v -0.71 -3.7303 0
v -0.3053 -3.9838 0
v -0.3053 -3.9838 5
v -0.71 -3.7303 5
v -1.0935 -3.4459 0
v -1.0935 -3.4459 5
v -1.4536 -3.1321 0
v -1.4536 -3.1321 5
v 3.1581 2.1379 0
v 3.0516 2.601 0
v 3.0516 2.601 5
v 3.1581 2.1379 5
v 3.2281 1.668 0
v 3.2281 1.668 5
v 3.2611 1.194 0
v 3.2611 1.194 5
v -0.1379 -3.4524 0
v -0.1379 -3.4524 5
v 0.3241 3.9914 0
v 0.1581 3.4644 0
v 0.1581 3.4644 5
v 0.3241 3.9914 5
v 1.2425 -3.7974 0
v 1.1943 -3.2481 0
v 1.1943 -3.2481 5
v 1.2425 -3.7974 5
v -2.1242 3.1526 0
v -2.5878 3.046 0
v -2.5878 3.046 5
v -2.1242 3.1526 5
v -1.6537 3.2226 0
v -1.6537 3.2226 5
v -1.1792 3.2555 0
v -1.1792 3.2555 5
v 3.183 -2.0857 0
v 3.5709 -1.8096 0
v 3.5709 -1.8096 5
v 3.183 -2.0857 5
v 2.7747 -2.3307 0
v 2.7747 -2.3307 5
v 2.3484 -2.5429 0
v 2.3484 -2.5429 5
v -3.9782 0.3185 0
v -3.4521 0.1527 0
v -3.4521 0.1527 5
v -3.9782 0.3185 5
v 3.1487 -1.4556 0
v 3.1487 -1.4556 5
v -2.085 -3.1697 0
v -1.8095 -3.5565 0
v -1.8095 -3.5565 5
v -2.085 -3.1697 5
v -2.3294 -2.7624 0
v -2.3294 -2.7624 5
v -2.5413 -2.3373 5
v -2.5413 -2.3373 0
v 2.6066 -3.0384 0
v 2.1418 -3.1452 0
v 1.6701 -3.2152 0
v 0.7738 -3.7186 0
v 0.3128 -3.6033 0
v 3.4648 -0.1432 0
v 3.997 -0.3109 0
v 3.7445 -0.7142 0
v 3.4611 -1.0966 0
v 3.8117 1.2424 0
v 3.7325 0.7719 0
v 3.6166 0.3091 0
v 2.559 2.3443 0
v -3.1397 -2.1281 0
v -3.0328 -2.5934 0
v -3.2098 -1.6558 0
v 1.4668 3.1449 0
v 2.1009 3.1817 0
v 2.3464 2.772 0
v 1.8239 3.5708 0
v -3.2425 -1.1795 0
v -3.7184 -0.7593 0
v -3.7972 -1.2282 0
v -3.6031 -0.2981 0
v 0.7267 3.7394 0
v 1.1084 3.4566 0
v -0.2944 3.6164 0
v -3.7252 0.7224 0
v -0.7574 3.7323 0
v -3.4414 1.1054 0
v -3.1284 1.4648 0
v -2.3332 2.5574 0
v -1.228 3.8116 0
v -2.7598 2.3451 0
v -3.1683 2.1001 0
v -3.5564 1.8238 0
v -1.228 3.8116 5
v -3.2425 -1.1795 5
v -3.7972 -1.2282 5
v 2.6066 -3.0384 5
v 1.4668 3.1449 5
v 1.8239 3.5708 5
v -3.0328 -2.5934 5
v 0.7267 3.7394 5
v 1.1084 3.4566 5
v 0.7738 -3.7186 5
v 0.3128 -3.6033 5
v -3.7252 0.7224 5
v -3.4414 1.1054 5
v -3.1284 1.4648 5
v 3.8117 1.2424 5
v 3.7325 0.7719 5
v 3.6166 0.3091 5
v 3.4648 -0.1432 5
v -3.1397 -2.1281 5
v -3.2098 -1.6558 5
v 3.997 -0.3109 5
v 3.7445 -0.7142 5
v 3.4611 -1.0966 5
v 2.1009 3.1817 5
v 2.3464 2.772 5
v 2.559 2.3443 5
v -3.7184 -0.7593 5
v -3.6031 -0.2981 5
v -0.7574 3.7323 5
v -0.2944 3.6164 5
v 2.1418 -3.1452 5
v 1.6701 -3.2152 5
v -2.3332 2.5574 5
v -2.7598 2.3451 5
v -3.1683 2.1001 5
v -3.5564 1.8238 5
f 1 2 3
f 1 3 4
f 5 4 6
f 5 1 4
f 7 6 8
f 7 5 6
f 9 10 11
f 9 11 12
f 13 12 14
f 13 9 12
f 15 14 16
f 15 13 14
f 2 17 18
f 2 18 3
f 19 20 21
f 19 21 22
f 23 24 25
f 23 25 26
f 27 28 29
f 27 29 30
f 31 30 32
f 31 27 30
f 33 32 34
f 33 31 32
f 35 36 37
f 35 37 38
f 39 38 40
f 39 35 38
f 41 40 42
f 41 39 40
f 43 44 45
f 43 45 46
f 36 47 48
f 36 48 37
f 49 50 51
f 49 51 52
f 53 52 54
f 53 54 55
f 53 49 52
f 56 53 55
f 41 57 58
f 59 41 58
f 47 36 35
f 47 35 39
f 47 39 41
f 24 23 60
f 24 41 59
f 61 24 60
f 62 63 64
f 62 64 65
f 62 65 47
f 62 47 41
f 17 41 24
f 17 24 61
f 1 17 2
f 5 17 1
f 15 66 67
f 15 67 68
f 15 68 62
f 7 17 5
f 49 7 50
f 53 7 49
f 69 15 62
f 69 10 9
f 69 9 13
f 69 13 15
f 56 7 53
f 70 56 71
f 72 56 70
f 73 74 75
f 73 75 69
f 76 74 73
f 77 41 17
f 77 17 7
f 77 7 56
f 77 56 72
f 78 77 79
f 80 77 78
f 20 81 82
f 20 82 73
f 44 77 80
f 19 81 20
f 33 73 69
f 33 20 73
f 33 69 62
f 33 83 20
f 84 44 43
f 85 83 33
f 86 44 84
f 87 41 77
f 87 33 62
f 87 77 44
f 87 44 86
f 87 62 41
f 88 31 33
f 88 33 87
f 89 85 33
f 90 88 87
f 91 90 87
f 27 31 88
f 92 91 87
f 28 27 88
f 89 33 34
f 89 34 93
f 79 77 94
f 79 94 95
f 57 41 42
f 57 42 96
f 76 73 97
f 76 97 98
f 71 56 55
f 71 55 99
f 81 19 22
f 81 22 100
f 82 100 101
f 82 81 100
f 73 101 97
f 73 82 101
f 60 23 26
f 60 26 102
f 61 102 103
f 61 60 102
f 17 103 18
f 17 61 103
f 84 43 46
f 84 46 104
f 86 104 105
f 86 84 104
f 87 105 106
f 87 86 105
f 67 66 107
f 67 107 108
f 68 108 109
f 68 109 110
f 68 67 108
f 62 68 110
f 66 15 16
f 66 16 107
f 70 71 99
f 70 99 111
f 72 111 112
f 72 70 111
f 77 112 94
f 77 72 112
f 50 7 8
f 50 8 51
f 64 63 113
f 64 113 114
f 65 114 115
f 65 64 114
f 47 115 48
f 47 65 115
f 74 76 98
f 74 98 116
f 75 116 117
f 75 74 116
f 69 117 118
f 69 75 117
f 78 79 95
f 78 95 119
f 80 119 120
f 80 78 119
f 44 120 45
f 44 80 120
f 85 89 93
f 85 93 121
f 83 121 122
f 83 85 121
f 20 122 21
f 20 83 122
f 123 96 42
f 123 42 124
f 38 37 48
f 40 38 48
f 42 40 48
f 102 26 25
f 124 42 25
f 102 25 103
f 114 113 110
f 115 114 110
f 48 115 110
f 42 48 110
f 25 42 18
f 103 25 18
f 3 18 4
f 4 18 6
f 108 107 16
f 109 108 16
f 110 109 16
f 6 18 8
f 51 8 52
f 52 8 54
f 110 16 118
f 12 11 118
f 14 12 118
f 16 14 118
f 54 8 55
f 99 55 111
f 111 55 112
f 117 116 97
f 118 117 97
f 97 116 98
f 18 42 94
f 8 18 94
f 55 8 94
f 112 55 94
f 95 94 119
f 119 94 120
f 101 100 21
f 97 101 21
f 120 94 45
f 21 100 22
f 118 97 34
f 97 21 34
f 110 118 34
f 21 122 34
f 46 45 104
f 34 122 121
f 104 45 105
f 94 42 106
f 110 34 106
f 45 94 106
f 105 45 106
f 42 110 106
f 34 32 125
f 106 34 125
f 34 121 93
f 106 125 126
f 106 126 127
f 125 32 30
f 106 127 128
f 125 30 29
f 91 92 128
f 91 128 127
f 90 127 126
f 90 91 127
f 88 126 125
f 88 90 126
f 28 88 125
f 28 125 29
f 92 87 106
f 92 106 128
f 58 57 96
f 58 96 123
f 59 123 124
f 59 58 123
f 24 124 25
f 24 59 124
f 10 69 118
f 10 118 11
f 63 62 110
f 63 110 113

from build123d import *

# Parameters (mm, degrees)
BOSS_EXTRUDE3_DEPTH = 5


with BuildPart() as part:
    # Sketch1 → Boss-Extrude3 (new body)
    with BuildSketch(Plane.XY):
        with BuildLine():
            Line((3.261099582, 1.194049175), (3.81171563, 1.242385454))
            ThreePointArc((3.81171563, 1.242385454), (3.679113284, 0.539346603), (3.464772438, -0.143225745))
            Line((3.464772438, -0.143225745), (3.997006384, -0.310865928))
            ThreePointArc((3.997006384, -0.310865928), (3.606544346, -0.90817684), (3.148727576, -1.455574989))
            Line((3.148727576, -1.455574989), (3.570884713, -1.8095948))
            ThreePointArc((3.570884713, -1.8095948), (2.981242264, -2.212207675), (2.348432127, -2.542853522))
            Line((2.348432127, -2.542853522), (2.60656535, -3.038366017))
            ThreePointArc((2.60656535, -3.038366017), (1.906611892, -3.184852059), (1.194293663, -3.248063959))
            Line((1.194293663, -3.248063959), (1.242515605, -3.797377559))
            ThreePointArc((1.242515605, -3.797377559), (0.542181479, -3.66545179), (-0.137882302, -3.452412943))
            Line((-0.137882302, -3.452412943), (-0.305258742, -3.983809541))
            ThreePointArc((-0.305258742, -3.983809541), (-0.904553156, -3.591877018), (-1.453561846, -3.132144098))
            Line((-1.453561846, -3.132144098), (-1.809464649, -3.556546643))
            ThreePointArc((-1.809464649, -3.556546643), (-2.211164681, -2.968425537), (-2.541266837, -2.337329731))
            Line((-2.541266837, -2.337329731), (-3.03275883, -2.593368507))
            ThreePointArc((-3.03275883, -2.593368507), (-3.17936368, -1.892614543), (-3.242504481, -1.179478974))
            Line((-3.242504481, -1.179478974), (-3.797247408, -1.228177535))
            ThreePointArc((-3.797247408, -1.228177535), (-3.665254009, -0.527572813), (-3.452085069, 0.152741995))
            Line((-3.452085069, 0.152741995), (-3.978202355, 0.318455585))
            ThreePointArc((-3.978202355, 0.318455585), (-3.587058838, 0.916685937), (-3.128354184, 1.464830849))
            Line((-3.128354184, 1.464830849), (-3.556416492, 1.823802719))
            ThreePointArc((-3.556416492, 1.823802719), (-2.966435761, 2.226618489), (-2.333244393, 2.55738502))
            Line((-2.333244393, 2.55738502), (-2.587761321, 3.045955674))
            ThreePointArc((-2.587761321, 3.045955674), (-1.889660833, 3.19216629), (-1.179234612, 3.255541529))
            Line((-1.179234612, 3.255541529), (-1.228047384, 3.811585479))
            ThreePointArc((-1.228047384, 3.811585479), (-0.524737953, 3.678915376), (0.158085284, 3.464444075))
            Line((0.158085284, 3.464444075), (0.324062771, 3.991399198))
            ThreePointArc((0.324062771, 3.991399198), (0.92030935, 3.601725697), (1.466842606, 3.144936008))
            Line((1.466842606, 3.144936008), (1.82393287, 3.570754562))
            ThreePointArc((1.82393287, 3.570754562), (2.227660979, 2.979252099), (2.558969454, 2.344345616))
            Line((2.558969454, 2.344345616), (3.05156286, 2.600958164))
            ThreePointArc((3.05156286, 2.600958164), (3.197654322, 1.903658089), (3.261099582, 1.194049175))
        make_face()
    extrude(amount=BOSS_EXTRUDE3_DEPTH)


solid = part.part
